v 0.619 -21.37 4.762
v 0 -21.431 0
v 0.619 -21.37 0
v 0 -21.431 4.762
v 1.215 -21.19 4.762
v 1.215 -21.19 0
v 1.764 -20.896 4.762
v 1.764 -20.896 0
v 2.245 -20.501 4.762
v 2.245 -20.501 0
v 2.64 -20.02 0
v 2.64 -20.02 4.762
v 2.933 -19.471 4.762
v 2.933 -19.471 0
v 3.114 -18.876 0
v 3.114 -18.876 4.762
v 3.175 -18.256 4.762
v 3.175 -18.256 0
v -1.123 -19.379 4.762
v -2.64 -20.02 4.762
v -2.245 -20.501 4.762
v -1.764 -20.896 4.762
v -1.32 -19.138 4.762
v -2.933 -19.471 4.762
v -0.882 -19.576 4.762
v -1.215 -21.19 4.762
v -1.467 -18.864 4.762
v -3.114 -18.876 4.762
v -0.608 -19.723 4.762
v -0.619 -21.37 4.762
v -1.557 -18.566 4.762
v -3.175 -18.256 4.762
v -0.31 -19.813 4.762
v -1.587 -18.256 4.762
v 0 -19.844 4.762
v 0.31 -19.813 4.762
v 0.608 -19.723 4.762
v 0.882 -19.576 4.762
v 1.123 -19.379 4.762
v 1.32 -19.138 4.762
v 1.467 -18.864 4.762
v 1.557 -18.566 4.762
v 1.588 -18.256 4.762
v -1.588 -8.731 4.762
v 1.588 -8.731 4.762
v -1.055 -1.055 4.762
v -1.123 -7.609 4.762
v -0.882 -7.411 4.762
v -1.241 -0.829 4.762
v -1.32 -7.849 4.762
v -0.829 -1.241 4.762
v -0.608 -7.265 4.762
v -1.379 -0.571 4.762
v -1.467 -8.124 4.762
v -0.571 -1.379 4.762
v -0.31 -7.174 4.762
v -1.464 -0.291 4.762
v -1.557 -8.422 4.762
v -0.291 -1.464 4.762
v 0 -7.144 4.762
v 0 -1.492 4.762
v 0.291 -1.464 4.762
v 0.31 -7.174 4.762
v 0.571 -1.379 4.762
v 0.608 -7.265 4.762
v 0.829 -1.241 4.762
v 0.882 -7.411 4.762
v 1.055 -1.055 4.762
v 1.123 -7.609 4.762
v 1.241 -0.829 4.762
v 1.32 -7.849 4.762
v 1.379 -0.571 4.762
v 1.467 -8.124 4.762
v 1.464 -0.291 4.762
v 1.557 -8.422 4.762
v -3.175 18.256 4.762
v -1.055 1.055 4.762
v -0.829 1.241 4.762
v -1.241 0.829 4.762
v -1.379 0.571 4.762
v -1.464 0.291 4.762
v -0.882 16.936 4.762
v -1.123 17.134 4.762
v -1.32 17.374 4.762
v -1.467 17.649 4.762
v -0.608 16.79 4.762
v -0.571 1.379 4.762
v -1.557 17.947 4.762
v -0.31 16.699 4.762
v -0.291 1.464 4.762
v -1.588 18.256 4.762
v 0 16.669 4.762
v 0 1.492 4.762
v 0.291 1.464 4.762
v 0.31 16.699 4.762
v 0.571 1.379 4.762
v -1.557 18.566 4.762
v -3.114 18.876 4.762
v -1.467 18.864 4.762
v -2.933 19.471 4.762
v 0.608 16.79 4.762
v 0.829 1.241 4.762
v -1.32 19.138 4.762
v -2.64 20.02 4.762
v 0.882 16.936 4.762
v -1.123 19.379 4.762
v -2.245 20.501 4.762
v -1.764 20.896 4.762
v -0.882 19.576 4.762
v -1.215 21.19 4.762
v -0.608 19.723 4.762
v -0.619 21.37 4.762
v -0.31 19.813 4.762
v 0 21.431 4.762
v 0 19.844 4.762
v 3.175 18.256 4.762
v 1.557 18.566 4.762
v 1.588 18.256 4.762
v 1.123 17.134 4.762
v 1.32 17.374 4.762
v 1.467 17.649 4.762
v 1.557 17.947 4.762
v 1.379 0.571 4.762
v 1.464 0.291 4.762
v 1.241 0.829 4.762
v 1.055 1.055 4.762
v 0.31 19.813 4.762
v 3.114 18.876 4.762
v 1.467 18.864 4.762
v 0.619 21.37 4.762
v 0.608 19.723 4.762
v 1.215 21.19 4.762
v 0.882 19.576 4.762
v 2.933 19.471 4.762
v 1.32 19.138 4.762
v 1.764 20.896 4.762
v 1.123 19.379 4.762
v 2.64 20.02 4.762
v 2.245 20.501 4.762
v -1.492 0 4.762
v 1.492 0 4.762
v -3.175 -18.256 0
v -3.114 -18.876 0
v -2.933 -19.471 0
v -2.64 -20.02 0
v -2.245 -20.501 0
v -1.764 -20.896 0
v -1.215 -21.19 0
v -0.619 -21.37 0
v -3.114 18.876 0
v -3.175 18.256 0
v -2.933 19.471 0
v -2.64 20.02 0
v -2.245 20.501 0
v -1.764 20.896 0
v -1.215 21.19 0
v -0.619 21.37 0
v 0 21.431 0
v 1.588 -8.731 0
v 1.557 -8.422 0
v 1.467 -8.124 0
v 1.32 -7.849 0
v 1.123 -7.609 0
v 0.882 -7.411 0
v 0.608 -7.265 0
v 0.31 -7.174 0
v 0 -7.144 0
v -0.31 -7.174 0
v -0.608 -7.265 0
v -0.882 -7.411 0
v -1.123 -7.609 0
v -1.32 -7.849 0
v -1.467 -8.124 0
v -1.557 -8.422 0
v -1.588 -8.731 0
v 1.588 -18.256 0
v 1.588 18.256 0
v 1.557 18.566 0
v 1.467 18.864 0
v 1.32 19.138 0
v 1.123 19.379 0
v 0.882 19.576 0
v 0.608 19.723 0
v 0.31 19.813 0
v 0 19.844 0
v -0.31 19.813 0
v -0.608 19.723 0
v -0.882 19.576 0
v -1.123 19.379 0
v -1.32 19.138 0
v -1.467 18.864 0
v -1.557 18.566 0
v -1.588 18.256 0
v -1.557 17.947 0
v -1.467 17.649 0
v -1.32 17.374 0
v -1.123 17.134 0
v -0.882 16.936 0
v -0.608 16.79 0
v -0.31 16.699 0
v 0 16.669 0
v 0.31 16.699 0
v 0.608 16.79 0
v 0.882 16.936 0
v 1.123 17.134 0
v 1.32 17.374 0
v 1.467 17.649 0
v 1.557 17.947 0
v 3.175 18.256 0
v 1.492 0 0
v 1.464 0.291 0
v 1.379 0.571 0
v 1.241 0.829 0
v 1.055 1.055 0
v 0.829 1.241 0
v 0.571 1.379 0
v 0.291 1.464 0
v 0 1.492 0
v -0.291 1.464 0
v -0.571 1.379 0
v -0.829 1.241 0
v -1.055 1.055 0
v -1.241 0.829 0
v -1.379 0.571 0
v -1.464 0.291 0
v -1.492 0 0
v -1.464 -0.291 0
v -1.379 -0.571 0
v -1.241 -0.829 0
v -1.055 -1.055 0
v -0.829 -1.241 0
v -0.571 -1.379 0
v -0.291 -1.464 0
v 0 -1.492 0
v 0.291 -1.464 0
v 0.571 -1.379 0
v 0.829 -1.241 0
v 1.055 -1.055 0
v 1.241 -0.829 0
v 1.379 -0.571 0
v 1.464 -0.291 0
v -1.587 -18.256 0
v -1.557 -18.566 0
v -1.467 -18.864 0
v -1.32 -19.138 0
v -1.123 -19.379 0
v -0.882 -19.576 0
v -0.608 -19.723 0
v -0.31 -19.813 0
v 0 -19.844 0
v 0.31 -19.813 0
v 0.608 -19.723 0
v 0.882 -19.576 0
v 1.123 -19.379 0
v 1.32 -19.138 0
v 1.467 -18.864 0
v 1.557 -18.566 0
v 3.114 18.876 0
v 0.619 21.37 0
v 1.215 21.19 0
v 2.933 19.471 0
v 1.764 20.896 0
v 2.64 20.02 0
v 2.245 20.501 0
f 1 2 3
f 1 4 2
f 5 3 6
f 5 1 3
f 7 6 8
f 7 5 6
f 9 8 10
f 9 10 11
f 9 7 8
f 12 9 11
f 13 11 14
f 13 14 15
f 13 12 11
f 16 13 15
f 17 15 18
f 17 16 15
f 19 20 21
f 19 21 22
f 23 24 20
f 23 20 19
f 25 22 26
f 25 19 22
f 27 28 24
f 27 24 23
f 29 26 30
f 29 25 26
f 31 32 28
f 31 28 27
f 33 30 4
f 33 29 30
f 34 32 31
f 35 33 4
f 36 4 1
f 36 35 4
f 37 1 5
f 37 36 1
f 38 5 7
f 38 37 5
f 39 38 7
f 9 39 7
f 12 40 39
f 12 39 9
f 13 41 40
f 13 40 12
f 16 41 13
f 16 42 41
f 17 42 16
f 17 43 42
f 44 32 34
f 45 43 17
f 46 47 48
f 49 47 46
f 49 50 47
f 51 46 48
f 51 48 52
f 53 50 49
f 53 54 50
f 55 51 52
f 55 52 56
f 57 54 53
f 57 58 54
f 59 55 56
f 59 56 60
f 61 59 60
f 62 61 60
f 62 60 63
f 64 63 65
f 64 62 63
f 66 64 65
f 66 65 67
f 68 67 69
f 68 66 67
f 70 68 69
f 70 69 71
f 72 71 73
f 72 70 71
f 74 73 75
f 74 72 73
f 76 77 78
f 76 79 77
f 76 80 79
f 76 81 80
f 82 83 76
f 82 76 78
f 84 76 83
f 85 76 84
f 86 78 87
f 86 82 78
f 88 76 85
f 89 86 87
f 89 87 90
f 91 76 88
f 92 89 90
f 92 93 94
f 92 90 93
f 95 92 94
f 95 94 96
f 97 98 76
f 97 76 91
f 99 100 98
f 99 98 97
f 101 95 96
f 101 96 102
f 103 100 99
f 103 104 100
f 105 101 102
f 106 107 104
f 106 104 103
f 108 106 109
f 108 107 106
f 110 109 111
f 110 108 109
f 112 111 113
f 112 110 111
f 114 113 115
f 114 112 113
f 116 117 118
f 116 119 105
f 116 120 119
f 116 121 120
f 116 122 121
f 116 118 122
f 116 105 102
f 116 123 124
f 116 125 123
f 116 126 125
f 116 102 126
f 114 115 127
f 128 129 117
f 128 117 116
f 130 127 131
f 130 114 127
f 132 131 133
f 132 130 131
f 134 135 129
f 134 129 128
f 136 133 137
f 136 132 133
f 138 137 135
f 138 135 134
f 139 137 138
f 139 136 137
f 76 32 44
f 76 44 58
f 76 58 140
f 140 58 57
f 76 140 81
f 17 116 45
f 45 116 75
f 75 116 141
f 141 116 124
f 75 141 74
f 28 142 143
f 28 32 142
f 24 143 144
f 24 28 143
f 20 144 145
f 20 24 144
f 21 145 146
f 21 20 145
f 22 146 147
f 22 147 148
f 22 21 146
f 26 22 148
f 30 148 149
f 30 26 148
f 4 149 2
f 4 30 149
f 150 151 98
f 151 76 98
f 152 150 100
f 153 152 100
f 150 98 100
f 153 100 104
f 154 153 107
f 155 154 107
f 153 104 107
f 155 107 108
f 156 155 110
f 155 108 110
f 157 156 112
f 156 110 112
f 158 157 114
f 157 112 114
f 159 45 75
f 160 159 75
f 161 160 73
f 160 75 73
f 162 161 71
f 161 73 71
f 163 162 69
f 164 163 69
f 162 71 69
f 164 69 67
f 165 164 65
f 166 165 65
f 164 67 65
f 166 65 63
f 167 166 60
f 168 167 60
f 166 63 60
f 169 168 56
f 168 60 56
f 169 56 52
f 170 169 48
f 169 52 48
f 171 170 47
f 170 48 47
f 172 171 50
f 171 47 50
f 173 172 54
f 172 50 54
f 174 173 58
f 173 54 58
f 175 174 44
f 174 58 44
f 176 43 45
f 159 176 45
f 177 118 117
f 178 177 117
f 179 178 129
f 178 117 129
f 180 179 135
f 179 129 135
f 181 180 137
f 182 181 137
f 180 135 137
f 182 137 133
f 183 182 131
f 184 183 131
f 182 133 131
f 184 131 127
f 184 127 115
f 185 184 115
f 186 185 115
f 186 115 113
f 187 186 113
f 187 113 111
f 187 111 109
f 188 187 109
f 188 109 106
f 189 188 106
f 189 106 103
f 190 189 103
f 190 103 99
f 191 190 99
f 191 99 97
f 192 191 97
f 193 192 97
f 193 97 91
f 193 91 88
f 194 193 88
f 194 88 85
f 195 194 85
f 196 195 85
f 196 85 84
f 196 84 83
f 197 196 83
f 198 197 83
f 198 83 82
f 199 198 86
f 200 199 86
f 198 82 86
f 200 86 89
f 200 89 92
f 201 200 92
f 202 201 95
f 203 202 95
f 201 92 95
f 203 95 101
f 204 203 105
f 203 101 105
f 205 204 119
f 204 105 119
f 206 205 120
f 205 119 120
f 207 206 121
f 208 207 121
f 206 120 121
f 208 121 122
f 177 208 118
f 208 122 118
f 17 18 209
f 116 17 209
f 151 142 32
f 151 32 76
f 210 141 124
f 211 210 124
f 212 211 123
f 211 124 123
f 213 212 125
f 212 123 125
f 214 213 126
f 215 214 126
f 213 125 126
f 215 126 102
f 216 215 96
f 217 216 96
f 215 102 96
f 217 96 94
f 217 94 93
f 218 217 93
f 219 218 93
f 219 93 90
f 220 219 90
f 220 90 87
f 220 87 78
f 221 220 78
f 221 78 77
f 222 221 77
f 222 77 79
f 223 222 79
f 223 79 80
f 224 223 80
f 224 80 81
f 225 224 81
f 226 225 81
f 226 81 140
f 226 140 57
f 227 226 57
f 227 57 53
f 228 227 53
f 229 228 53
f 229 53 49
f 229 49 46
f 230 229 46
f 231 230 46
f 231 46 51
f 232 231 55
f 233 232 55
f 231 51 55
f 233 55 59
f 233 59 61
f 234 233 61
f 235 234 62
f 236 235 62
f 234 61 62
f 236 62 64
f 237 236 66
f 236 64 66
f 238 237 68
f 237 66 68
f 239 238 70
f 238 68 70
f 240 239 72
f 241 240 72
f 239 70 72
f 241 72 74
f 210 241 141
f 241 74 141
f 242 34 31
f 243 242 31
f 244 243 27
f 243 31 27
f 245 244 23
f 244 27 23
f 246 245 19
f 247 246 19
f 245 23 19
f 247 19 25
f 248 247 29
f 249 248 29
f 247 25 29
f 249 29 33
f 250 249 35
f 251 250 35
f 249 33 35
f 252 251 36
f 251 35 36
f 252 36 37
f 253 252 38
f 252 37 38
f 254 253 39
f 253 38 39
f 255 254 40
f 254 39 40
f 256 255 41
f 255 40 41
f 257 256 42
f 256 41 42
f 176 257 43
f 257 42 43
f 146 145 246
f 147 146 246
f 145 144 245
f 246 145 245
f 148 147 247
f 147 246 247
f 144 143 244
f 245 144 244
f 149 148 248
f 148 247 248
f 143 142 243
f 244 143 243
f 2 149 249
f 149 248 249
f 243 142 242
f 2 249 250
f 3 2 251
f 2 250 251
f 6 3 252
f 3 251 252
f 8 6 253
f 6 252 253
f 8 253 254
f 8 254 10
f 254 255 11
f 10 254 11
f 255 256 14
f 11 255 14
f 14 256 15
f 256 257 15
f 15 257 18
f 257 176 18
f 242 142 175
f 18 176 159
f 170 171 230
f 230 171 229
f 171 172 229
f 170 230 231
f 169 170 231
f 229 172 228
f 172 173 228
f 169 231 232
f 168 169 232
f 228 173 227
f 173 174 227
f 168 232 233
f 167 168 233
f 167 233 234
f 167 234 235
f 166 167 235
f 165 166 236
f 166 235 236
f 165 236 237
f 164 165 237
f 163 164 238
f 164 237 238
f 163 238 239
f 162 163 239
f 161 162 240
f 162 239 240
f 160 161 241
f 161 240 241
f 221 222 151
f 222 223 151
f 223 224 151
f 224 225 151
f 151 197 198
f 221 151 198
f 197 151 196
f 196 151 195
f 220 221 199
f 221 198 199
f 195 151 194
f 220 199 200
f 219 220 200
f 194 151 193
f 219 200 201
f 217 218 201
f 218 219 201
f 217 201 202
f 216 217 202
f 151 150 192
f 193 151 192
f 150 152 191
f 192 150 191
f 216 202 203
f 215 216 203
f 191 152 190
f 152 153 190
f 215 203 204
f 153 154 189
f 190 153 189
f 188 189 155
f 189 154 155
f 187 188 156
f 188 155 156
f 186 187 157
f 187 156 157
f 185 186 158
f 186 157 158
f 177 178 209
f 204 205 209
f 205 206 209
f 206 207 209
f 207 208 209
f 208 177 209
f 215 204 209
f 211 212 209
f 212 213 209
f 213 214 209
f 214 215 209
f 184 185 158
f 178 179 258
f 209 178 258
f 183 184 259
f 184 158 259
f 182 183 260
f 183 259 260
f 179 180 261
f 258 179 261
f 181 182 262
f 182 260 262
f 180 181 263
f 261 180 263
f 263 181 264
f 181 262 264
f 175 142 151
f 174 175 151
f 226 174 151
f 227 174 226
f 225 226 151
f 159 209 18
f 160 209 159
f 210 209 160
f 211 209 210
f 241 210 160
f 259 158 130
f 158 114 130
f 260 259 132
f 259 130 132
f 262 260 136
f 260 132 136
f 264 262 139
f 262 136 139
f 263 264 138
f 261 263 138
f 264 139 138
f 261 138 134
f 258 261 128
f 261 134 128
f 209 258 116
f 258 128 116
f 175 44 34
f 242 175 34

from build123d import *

# Parameters (mm, degrees)
SKETCH1_W           = 6.35
SKETCH1_H           = 42.8625
BOSS_EXTRUDE1_DEPTH = 4.7625
SKETCH2_R           = 1.49225
CUT_EXTRUDE1_DEPTH  = 23.182436922
SKETCH3_R           = 1.5875
CUT_EXTRUDE2_DEPTH  = 23.182436922
FILLET1_R           = 3.175


with BuildPart() as part:
    # Sketch1 → Boss-Extrude1 (new body)
    with BuildSketch(Plane.XY):
        Rectangle(SKETCH1_W, SKETCH1_H)
    extrude(amount=BOSS_EXTRUDE1_DEPTH)

    # Sketch2 → Cut-Extrude1 (cut, through all)
    with BuildSketch(Plane.XY.offset(4.7625)):
        Circle(SKETCH2_R)
    extrude(amount=-CUT_EXTRUDE1_DEPTH, mode=Mode.SUBTRACT)

    # Sketch3 → Cut-Extrude2 (cut, through all)
    with BuildSketch(Plane.XY.offset(4.7625)):
        with Locations((0, 18.25625)):
            Circle(SKETCH3_R)
        with BuildLine():
            Line((1.5875, -18.25625), (1.5875, -8.73125))
            ThreePointArc((1.5875, -8.73125), (0, -7.14375), (-1.5875, -8.73125))
            Line((-1.5875, -8.73125), (-1.5875, -18.25625))
            ThreePointArc((-1.5875, -18.25625), (0, -19.84375), (1.5875, -18.25625))
        make_face()
    extrude(amount=-CUT_EXTRUDE2_DEPTH, mode=Mode.SUBTRACT)

    # Fillet1
    fillet1_edges = [part.edges().sort_by_distance(p)[0] for p in [
        (-3.175, 21.43125, 2.38125),
        (3.175, 21.43125, 2.38125),
        (-3.175, -21.43125, 2.38125),
        (3.175, -21.43125, 2.38125),
    ]]
    fillet(fillet1_edges, radius=FILLET1_R - 0.0001)  # a hair under: the kernel refuses the full size


solid = part.part
